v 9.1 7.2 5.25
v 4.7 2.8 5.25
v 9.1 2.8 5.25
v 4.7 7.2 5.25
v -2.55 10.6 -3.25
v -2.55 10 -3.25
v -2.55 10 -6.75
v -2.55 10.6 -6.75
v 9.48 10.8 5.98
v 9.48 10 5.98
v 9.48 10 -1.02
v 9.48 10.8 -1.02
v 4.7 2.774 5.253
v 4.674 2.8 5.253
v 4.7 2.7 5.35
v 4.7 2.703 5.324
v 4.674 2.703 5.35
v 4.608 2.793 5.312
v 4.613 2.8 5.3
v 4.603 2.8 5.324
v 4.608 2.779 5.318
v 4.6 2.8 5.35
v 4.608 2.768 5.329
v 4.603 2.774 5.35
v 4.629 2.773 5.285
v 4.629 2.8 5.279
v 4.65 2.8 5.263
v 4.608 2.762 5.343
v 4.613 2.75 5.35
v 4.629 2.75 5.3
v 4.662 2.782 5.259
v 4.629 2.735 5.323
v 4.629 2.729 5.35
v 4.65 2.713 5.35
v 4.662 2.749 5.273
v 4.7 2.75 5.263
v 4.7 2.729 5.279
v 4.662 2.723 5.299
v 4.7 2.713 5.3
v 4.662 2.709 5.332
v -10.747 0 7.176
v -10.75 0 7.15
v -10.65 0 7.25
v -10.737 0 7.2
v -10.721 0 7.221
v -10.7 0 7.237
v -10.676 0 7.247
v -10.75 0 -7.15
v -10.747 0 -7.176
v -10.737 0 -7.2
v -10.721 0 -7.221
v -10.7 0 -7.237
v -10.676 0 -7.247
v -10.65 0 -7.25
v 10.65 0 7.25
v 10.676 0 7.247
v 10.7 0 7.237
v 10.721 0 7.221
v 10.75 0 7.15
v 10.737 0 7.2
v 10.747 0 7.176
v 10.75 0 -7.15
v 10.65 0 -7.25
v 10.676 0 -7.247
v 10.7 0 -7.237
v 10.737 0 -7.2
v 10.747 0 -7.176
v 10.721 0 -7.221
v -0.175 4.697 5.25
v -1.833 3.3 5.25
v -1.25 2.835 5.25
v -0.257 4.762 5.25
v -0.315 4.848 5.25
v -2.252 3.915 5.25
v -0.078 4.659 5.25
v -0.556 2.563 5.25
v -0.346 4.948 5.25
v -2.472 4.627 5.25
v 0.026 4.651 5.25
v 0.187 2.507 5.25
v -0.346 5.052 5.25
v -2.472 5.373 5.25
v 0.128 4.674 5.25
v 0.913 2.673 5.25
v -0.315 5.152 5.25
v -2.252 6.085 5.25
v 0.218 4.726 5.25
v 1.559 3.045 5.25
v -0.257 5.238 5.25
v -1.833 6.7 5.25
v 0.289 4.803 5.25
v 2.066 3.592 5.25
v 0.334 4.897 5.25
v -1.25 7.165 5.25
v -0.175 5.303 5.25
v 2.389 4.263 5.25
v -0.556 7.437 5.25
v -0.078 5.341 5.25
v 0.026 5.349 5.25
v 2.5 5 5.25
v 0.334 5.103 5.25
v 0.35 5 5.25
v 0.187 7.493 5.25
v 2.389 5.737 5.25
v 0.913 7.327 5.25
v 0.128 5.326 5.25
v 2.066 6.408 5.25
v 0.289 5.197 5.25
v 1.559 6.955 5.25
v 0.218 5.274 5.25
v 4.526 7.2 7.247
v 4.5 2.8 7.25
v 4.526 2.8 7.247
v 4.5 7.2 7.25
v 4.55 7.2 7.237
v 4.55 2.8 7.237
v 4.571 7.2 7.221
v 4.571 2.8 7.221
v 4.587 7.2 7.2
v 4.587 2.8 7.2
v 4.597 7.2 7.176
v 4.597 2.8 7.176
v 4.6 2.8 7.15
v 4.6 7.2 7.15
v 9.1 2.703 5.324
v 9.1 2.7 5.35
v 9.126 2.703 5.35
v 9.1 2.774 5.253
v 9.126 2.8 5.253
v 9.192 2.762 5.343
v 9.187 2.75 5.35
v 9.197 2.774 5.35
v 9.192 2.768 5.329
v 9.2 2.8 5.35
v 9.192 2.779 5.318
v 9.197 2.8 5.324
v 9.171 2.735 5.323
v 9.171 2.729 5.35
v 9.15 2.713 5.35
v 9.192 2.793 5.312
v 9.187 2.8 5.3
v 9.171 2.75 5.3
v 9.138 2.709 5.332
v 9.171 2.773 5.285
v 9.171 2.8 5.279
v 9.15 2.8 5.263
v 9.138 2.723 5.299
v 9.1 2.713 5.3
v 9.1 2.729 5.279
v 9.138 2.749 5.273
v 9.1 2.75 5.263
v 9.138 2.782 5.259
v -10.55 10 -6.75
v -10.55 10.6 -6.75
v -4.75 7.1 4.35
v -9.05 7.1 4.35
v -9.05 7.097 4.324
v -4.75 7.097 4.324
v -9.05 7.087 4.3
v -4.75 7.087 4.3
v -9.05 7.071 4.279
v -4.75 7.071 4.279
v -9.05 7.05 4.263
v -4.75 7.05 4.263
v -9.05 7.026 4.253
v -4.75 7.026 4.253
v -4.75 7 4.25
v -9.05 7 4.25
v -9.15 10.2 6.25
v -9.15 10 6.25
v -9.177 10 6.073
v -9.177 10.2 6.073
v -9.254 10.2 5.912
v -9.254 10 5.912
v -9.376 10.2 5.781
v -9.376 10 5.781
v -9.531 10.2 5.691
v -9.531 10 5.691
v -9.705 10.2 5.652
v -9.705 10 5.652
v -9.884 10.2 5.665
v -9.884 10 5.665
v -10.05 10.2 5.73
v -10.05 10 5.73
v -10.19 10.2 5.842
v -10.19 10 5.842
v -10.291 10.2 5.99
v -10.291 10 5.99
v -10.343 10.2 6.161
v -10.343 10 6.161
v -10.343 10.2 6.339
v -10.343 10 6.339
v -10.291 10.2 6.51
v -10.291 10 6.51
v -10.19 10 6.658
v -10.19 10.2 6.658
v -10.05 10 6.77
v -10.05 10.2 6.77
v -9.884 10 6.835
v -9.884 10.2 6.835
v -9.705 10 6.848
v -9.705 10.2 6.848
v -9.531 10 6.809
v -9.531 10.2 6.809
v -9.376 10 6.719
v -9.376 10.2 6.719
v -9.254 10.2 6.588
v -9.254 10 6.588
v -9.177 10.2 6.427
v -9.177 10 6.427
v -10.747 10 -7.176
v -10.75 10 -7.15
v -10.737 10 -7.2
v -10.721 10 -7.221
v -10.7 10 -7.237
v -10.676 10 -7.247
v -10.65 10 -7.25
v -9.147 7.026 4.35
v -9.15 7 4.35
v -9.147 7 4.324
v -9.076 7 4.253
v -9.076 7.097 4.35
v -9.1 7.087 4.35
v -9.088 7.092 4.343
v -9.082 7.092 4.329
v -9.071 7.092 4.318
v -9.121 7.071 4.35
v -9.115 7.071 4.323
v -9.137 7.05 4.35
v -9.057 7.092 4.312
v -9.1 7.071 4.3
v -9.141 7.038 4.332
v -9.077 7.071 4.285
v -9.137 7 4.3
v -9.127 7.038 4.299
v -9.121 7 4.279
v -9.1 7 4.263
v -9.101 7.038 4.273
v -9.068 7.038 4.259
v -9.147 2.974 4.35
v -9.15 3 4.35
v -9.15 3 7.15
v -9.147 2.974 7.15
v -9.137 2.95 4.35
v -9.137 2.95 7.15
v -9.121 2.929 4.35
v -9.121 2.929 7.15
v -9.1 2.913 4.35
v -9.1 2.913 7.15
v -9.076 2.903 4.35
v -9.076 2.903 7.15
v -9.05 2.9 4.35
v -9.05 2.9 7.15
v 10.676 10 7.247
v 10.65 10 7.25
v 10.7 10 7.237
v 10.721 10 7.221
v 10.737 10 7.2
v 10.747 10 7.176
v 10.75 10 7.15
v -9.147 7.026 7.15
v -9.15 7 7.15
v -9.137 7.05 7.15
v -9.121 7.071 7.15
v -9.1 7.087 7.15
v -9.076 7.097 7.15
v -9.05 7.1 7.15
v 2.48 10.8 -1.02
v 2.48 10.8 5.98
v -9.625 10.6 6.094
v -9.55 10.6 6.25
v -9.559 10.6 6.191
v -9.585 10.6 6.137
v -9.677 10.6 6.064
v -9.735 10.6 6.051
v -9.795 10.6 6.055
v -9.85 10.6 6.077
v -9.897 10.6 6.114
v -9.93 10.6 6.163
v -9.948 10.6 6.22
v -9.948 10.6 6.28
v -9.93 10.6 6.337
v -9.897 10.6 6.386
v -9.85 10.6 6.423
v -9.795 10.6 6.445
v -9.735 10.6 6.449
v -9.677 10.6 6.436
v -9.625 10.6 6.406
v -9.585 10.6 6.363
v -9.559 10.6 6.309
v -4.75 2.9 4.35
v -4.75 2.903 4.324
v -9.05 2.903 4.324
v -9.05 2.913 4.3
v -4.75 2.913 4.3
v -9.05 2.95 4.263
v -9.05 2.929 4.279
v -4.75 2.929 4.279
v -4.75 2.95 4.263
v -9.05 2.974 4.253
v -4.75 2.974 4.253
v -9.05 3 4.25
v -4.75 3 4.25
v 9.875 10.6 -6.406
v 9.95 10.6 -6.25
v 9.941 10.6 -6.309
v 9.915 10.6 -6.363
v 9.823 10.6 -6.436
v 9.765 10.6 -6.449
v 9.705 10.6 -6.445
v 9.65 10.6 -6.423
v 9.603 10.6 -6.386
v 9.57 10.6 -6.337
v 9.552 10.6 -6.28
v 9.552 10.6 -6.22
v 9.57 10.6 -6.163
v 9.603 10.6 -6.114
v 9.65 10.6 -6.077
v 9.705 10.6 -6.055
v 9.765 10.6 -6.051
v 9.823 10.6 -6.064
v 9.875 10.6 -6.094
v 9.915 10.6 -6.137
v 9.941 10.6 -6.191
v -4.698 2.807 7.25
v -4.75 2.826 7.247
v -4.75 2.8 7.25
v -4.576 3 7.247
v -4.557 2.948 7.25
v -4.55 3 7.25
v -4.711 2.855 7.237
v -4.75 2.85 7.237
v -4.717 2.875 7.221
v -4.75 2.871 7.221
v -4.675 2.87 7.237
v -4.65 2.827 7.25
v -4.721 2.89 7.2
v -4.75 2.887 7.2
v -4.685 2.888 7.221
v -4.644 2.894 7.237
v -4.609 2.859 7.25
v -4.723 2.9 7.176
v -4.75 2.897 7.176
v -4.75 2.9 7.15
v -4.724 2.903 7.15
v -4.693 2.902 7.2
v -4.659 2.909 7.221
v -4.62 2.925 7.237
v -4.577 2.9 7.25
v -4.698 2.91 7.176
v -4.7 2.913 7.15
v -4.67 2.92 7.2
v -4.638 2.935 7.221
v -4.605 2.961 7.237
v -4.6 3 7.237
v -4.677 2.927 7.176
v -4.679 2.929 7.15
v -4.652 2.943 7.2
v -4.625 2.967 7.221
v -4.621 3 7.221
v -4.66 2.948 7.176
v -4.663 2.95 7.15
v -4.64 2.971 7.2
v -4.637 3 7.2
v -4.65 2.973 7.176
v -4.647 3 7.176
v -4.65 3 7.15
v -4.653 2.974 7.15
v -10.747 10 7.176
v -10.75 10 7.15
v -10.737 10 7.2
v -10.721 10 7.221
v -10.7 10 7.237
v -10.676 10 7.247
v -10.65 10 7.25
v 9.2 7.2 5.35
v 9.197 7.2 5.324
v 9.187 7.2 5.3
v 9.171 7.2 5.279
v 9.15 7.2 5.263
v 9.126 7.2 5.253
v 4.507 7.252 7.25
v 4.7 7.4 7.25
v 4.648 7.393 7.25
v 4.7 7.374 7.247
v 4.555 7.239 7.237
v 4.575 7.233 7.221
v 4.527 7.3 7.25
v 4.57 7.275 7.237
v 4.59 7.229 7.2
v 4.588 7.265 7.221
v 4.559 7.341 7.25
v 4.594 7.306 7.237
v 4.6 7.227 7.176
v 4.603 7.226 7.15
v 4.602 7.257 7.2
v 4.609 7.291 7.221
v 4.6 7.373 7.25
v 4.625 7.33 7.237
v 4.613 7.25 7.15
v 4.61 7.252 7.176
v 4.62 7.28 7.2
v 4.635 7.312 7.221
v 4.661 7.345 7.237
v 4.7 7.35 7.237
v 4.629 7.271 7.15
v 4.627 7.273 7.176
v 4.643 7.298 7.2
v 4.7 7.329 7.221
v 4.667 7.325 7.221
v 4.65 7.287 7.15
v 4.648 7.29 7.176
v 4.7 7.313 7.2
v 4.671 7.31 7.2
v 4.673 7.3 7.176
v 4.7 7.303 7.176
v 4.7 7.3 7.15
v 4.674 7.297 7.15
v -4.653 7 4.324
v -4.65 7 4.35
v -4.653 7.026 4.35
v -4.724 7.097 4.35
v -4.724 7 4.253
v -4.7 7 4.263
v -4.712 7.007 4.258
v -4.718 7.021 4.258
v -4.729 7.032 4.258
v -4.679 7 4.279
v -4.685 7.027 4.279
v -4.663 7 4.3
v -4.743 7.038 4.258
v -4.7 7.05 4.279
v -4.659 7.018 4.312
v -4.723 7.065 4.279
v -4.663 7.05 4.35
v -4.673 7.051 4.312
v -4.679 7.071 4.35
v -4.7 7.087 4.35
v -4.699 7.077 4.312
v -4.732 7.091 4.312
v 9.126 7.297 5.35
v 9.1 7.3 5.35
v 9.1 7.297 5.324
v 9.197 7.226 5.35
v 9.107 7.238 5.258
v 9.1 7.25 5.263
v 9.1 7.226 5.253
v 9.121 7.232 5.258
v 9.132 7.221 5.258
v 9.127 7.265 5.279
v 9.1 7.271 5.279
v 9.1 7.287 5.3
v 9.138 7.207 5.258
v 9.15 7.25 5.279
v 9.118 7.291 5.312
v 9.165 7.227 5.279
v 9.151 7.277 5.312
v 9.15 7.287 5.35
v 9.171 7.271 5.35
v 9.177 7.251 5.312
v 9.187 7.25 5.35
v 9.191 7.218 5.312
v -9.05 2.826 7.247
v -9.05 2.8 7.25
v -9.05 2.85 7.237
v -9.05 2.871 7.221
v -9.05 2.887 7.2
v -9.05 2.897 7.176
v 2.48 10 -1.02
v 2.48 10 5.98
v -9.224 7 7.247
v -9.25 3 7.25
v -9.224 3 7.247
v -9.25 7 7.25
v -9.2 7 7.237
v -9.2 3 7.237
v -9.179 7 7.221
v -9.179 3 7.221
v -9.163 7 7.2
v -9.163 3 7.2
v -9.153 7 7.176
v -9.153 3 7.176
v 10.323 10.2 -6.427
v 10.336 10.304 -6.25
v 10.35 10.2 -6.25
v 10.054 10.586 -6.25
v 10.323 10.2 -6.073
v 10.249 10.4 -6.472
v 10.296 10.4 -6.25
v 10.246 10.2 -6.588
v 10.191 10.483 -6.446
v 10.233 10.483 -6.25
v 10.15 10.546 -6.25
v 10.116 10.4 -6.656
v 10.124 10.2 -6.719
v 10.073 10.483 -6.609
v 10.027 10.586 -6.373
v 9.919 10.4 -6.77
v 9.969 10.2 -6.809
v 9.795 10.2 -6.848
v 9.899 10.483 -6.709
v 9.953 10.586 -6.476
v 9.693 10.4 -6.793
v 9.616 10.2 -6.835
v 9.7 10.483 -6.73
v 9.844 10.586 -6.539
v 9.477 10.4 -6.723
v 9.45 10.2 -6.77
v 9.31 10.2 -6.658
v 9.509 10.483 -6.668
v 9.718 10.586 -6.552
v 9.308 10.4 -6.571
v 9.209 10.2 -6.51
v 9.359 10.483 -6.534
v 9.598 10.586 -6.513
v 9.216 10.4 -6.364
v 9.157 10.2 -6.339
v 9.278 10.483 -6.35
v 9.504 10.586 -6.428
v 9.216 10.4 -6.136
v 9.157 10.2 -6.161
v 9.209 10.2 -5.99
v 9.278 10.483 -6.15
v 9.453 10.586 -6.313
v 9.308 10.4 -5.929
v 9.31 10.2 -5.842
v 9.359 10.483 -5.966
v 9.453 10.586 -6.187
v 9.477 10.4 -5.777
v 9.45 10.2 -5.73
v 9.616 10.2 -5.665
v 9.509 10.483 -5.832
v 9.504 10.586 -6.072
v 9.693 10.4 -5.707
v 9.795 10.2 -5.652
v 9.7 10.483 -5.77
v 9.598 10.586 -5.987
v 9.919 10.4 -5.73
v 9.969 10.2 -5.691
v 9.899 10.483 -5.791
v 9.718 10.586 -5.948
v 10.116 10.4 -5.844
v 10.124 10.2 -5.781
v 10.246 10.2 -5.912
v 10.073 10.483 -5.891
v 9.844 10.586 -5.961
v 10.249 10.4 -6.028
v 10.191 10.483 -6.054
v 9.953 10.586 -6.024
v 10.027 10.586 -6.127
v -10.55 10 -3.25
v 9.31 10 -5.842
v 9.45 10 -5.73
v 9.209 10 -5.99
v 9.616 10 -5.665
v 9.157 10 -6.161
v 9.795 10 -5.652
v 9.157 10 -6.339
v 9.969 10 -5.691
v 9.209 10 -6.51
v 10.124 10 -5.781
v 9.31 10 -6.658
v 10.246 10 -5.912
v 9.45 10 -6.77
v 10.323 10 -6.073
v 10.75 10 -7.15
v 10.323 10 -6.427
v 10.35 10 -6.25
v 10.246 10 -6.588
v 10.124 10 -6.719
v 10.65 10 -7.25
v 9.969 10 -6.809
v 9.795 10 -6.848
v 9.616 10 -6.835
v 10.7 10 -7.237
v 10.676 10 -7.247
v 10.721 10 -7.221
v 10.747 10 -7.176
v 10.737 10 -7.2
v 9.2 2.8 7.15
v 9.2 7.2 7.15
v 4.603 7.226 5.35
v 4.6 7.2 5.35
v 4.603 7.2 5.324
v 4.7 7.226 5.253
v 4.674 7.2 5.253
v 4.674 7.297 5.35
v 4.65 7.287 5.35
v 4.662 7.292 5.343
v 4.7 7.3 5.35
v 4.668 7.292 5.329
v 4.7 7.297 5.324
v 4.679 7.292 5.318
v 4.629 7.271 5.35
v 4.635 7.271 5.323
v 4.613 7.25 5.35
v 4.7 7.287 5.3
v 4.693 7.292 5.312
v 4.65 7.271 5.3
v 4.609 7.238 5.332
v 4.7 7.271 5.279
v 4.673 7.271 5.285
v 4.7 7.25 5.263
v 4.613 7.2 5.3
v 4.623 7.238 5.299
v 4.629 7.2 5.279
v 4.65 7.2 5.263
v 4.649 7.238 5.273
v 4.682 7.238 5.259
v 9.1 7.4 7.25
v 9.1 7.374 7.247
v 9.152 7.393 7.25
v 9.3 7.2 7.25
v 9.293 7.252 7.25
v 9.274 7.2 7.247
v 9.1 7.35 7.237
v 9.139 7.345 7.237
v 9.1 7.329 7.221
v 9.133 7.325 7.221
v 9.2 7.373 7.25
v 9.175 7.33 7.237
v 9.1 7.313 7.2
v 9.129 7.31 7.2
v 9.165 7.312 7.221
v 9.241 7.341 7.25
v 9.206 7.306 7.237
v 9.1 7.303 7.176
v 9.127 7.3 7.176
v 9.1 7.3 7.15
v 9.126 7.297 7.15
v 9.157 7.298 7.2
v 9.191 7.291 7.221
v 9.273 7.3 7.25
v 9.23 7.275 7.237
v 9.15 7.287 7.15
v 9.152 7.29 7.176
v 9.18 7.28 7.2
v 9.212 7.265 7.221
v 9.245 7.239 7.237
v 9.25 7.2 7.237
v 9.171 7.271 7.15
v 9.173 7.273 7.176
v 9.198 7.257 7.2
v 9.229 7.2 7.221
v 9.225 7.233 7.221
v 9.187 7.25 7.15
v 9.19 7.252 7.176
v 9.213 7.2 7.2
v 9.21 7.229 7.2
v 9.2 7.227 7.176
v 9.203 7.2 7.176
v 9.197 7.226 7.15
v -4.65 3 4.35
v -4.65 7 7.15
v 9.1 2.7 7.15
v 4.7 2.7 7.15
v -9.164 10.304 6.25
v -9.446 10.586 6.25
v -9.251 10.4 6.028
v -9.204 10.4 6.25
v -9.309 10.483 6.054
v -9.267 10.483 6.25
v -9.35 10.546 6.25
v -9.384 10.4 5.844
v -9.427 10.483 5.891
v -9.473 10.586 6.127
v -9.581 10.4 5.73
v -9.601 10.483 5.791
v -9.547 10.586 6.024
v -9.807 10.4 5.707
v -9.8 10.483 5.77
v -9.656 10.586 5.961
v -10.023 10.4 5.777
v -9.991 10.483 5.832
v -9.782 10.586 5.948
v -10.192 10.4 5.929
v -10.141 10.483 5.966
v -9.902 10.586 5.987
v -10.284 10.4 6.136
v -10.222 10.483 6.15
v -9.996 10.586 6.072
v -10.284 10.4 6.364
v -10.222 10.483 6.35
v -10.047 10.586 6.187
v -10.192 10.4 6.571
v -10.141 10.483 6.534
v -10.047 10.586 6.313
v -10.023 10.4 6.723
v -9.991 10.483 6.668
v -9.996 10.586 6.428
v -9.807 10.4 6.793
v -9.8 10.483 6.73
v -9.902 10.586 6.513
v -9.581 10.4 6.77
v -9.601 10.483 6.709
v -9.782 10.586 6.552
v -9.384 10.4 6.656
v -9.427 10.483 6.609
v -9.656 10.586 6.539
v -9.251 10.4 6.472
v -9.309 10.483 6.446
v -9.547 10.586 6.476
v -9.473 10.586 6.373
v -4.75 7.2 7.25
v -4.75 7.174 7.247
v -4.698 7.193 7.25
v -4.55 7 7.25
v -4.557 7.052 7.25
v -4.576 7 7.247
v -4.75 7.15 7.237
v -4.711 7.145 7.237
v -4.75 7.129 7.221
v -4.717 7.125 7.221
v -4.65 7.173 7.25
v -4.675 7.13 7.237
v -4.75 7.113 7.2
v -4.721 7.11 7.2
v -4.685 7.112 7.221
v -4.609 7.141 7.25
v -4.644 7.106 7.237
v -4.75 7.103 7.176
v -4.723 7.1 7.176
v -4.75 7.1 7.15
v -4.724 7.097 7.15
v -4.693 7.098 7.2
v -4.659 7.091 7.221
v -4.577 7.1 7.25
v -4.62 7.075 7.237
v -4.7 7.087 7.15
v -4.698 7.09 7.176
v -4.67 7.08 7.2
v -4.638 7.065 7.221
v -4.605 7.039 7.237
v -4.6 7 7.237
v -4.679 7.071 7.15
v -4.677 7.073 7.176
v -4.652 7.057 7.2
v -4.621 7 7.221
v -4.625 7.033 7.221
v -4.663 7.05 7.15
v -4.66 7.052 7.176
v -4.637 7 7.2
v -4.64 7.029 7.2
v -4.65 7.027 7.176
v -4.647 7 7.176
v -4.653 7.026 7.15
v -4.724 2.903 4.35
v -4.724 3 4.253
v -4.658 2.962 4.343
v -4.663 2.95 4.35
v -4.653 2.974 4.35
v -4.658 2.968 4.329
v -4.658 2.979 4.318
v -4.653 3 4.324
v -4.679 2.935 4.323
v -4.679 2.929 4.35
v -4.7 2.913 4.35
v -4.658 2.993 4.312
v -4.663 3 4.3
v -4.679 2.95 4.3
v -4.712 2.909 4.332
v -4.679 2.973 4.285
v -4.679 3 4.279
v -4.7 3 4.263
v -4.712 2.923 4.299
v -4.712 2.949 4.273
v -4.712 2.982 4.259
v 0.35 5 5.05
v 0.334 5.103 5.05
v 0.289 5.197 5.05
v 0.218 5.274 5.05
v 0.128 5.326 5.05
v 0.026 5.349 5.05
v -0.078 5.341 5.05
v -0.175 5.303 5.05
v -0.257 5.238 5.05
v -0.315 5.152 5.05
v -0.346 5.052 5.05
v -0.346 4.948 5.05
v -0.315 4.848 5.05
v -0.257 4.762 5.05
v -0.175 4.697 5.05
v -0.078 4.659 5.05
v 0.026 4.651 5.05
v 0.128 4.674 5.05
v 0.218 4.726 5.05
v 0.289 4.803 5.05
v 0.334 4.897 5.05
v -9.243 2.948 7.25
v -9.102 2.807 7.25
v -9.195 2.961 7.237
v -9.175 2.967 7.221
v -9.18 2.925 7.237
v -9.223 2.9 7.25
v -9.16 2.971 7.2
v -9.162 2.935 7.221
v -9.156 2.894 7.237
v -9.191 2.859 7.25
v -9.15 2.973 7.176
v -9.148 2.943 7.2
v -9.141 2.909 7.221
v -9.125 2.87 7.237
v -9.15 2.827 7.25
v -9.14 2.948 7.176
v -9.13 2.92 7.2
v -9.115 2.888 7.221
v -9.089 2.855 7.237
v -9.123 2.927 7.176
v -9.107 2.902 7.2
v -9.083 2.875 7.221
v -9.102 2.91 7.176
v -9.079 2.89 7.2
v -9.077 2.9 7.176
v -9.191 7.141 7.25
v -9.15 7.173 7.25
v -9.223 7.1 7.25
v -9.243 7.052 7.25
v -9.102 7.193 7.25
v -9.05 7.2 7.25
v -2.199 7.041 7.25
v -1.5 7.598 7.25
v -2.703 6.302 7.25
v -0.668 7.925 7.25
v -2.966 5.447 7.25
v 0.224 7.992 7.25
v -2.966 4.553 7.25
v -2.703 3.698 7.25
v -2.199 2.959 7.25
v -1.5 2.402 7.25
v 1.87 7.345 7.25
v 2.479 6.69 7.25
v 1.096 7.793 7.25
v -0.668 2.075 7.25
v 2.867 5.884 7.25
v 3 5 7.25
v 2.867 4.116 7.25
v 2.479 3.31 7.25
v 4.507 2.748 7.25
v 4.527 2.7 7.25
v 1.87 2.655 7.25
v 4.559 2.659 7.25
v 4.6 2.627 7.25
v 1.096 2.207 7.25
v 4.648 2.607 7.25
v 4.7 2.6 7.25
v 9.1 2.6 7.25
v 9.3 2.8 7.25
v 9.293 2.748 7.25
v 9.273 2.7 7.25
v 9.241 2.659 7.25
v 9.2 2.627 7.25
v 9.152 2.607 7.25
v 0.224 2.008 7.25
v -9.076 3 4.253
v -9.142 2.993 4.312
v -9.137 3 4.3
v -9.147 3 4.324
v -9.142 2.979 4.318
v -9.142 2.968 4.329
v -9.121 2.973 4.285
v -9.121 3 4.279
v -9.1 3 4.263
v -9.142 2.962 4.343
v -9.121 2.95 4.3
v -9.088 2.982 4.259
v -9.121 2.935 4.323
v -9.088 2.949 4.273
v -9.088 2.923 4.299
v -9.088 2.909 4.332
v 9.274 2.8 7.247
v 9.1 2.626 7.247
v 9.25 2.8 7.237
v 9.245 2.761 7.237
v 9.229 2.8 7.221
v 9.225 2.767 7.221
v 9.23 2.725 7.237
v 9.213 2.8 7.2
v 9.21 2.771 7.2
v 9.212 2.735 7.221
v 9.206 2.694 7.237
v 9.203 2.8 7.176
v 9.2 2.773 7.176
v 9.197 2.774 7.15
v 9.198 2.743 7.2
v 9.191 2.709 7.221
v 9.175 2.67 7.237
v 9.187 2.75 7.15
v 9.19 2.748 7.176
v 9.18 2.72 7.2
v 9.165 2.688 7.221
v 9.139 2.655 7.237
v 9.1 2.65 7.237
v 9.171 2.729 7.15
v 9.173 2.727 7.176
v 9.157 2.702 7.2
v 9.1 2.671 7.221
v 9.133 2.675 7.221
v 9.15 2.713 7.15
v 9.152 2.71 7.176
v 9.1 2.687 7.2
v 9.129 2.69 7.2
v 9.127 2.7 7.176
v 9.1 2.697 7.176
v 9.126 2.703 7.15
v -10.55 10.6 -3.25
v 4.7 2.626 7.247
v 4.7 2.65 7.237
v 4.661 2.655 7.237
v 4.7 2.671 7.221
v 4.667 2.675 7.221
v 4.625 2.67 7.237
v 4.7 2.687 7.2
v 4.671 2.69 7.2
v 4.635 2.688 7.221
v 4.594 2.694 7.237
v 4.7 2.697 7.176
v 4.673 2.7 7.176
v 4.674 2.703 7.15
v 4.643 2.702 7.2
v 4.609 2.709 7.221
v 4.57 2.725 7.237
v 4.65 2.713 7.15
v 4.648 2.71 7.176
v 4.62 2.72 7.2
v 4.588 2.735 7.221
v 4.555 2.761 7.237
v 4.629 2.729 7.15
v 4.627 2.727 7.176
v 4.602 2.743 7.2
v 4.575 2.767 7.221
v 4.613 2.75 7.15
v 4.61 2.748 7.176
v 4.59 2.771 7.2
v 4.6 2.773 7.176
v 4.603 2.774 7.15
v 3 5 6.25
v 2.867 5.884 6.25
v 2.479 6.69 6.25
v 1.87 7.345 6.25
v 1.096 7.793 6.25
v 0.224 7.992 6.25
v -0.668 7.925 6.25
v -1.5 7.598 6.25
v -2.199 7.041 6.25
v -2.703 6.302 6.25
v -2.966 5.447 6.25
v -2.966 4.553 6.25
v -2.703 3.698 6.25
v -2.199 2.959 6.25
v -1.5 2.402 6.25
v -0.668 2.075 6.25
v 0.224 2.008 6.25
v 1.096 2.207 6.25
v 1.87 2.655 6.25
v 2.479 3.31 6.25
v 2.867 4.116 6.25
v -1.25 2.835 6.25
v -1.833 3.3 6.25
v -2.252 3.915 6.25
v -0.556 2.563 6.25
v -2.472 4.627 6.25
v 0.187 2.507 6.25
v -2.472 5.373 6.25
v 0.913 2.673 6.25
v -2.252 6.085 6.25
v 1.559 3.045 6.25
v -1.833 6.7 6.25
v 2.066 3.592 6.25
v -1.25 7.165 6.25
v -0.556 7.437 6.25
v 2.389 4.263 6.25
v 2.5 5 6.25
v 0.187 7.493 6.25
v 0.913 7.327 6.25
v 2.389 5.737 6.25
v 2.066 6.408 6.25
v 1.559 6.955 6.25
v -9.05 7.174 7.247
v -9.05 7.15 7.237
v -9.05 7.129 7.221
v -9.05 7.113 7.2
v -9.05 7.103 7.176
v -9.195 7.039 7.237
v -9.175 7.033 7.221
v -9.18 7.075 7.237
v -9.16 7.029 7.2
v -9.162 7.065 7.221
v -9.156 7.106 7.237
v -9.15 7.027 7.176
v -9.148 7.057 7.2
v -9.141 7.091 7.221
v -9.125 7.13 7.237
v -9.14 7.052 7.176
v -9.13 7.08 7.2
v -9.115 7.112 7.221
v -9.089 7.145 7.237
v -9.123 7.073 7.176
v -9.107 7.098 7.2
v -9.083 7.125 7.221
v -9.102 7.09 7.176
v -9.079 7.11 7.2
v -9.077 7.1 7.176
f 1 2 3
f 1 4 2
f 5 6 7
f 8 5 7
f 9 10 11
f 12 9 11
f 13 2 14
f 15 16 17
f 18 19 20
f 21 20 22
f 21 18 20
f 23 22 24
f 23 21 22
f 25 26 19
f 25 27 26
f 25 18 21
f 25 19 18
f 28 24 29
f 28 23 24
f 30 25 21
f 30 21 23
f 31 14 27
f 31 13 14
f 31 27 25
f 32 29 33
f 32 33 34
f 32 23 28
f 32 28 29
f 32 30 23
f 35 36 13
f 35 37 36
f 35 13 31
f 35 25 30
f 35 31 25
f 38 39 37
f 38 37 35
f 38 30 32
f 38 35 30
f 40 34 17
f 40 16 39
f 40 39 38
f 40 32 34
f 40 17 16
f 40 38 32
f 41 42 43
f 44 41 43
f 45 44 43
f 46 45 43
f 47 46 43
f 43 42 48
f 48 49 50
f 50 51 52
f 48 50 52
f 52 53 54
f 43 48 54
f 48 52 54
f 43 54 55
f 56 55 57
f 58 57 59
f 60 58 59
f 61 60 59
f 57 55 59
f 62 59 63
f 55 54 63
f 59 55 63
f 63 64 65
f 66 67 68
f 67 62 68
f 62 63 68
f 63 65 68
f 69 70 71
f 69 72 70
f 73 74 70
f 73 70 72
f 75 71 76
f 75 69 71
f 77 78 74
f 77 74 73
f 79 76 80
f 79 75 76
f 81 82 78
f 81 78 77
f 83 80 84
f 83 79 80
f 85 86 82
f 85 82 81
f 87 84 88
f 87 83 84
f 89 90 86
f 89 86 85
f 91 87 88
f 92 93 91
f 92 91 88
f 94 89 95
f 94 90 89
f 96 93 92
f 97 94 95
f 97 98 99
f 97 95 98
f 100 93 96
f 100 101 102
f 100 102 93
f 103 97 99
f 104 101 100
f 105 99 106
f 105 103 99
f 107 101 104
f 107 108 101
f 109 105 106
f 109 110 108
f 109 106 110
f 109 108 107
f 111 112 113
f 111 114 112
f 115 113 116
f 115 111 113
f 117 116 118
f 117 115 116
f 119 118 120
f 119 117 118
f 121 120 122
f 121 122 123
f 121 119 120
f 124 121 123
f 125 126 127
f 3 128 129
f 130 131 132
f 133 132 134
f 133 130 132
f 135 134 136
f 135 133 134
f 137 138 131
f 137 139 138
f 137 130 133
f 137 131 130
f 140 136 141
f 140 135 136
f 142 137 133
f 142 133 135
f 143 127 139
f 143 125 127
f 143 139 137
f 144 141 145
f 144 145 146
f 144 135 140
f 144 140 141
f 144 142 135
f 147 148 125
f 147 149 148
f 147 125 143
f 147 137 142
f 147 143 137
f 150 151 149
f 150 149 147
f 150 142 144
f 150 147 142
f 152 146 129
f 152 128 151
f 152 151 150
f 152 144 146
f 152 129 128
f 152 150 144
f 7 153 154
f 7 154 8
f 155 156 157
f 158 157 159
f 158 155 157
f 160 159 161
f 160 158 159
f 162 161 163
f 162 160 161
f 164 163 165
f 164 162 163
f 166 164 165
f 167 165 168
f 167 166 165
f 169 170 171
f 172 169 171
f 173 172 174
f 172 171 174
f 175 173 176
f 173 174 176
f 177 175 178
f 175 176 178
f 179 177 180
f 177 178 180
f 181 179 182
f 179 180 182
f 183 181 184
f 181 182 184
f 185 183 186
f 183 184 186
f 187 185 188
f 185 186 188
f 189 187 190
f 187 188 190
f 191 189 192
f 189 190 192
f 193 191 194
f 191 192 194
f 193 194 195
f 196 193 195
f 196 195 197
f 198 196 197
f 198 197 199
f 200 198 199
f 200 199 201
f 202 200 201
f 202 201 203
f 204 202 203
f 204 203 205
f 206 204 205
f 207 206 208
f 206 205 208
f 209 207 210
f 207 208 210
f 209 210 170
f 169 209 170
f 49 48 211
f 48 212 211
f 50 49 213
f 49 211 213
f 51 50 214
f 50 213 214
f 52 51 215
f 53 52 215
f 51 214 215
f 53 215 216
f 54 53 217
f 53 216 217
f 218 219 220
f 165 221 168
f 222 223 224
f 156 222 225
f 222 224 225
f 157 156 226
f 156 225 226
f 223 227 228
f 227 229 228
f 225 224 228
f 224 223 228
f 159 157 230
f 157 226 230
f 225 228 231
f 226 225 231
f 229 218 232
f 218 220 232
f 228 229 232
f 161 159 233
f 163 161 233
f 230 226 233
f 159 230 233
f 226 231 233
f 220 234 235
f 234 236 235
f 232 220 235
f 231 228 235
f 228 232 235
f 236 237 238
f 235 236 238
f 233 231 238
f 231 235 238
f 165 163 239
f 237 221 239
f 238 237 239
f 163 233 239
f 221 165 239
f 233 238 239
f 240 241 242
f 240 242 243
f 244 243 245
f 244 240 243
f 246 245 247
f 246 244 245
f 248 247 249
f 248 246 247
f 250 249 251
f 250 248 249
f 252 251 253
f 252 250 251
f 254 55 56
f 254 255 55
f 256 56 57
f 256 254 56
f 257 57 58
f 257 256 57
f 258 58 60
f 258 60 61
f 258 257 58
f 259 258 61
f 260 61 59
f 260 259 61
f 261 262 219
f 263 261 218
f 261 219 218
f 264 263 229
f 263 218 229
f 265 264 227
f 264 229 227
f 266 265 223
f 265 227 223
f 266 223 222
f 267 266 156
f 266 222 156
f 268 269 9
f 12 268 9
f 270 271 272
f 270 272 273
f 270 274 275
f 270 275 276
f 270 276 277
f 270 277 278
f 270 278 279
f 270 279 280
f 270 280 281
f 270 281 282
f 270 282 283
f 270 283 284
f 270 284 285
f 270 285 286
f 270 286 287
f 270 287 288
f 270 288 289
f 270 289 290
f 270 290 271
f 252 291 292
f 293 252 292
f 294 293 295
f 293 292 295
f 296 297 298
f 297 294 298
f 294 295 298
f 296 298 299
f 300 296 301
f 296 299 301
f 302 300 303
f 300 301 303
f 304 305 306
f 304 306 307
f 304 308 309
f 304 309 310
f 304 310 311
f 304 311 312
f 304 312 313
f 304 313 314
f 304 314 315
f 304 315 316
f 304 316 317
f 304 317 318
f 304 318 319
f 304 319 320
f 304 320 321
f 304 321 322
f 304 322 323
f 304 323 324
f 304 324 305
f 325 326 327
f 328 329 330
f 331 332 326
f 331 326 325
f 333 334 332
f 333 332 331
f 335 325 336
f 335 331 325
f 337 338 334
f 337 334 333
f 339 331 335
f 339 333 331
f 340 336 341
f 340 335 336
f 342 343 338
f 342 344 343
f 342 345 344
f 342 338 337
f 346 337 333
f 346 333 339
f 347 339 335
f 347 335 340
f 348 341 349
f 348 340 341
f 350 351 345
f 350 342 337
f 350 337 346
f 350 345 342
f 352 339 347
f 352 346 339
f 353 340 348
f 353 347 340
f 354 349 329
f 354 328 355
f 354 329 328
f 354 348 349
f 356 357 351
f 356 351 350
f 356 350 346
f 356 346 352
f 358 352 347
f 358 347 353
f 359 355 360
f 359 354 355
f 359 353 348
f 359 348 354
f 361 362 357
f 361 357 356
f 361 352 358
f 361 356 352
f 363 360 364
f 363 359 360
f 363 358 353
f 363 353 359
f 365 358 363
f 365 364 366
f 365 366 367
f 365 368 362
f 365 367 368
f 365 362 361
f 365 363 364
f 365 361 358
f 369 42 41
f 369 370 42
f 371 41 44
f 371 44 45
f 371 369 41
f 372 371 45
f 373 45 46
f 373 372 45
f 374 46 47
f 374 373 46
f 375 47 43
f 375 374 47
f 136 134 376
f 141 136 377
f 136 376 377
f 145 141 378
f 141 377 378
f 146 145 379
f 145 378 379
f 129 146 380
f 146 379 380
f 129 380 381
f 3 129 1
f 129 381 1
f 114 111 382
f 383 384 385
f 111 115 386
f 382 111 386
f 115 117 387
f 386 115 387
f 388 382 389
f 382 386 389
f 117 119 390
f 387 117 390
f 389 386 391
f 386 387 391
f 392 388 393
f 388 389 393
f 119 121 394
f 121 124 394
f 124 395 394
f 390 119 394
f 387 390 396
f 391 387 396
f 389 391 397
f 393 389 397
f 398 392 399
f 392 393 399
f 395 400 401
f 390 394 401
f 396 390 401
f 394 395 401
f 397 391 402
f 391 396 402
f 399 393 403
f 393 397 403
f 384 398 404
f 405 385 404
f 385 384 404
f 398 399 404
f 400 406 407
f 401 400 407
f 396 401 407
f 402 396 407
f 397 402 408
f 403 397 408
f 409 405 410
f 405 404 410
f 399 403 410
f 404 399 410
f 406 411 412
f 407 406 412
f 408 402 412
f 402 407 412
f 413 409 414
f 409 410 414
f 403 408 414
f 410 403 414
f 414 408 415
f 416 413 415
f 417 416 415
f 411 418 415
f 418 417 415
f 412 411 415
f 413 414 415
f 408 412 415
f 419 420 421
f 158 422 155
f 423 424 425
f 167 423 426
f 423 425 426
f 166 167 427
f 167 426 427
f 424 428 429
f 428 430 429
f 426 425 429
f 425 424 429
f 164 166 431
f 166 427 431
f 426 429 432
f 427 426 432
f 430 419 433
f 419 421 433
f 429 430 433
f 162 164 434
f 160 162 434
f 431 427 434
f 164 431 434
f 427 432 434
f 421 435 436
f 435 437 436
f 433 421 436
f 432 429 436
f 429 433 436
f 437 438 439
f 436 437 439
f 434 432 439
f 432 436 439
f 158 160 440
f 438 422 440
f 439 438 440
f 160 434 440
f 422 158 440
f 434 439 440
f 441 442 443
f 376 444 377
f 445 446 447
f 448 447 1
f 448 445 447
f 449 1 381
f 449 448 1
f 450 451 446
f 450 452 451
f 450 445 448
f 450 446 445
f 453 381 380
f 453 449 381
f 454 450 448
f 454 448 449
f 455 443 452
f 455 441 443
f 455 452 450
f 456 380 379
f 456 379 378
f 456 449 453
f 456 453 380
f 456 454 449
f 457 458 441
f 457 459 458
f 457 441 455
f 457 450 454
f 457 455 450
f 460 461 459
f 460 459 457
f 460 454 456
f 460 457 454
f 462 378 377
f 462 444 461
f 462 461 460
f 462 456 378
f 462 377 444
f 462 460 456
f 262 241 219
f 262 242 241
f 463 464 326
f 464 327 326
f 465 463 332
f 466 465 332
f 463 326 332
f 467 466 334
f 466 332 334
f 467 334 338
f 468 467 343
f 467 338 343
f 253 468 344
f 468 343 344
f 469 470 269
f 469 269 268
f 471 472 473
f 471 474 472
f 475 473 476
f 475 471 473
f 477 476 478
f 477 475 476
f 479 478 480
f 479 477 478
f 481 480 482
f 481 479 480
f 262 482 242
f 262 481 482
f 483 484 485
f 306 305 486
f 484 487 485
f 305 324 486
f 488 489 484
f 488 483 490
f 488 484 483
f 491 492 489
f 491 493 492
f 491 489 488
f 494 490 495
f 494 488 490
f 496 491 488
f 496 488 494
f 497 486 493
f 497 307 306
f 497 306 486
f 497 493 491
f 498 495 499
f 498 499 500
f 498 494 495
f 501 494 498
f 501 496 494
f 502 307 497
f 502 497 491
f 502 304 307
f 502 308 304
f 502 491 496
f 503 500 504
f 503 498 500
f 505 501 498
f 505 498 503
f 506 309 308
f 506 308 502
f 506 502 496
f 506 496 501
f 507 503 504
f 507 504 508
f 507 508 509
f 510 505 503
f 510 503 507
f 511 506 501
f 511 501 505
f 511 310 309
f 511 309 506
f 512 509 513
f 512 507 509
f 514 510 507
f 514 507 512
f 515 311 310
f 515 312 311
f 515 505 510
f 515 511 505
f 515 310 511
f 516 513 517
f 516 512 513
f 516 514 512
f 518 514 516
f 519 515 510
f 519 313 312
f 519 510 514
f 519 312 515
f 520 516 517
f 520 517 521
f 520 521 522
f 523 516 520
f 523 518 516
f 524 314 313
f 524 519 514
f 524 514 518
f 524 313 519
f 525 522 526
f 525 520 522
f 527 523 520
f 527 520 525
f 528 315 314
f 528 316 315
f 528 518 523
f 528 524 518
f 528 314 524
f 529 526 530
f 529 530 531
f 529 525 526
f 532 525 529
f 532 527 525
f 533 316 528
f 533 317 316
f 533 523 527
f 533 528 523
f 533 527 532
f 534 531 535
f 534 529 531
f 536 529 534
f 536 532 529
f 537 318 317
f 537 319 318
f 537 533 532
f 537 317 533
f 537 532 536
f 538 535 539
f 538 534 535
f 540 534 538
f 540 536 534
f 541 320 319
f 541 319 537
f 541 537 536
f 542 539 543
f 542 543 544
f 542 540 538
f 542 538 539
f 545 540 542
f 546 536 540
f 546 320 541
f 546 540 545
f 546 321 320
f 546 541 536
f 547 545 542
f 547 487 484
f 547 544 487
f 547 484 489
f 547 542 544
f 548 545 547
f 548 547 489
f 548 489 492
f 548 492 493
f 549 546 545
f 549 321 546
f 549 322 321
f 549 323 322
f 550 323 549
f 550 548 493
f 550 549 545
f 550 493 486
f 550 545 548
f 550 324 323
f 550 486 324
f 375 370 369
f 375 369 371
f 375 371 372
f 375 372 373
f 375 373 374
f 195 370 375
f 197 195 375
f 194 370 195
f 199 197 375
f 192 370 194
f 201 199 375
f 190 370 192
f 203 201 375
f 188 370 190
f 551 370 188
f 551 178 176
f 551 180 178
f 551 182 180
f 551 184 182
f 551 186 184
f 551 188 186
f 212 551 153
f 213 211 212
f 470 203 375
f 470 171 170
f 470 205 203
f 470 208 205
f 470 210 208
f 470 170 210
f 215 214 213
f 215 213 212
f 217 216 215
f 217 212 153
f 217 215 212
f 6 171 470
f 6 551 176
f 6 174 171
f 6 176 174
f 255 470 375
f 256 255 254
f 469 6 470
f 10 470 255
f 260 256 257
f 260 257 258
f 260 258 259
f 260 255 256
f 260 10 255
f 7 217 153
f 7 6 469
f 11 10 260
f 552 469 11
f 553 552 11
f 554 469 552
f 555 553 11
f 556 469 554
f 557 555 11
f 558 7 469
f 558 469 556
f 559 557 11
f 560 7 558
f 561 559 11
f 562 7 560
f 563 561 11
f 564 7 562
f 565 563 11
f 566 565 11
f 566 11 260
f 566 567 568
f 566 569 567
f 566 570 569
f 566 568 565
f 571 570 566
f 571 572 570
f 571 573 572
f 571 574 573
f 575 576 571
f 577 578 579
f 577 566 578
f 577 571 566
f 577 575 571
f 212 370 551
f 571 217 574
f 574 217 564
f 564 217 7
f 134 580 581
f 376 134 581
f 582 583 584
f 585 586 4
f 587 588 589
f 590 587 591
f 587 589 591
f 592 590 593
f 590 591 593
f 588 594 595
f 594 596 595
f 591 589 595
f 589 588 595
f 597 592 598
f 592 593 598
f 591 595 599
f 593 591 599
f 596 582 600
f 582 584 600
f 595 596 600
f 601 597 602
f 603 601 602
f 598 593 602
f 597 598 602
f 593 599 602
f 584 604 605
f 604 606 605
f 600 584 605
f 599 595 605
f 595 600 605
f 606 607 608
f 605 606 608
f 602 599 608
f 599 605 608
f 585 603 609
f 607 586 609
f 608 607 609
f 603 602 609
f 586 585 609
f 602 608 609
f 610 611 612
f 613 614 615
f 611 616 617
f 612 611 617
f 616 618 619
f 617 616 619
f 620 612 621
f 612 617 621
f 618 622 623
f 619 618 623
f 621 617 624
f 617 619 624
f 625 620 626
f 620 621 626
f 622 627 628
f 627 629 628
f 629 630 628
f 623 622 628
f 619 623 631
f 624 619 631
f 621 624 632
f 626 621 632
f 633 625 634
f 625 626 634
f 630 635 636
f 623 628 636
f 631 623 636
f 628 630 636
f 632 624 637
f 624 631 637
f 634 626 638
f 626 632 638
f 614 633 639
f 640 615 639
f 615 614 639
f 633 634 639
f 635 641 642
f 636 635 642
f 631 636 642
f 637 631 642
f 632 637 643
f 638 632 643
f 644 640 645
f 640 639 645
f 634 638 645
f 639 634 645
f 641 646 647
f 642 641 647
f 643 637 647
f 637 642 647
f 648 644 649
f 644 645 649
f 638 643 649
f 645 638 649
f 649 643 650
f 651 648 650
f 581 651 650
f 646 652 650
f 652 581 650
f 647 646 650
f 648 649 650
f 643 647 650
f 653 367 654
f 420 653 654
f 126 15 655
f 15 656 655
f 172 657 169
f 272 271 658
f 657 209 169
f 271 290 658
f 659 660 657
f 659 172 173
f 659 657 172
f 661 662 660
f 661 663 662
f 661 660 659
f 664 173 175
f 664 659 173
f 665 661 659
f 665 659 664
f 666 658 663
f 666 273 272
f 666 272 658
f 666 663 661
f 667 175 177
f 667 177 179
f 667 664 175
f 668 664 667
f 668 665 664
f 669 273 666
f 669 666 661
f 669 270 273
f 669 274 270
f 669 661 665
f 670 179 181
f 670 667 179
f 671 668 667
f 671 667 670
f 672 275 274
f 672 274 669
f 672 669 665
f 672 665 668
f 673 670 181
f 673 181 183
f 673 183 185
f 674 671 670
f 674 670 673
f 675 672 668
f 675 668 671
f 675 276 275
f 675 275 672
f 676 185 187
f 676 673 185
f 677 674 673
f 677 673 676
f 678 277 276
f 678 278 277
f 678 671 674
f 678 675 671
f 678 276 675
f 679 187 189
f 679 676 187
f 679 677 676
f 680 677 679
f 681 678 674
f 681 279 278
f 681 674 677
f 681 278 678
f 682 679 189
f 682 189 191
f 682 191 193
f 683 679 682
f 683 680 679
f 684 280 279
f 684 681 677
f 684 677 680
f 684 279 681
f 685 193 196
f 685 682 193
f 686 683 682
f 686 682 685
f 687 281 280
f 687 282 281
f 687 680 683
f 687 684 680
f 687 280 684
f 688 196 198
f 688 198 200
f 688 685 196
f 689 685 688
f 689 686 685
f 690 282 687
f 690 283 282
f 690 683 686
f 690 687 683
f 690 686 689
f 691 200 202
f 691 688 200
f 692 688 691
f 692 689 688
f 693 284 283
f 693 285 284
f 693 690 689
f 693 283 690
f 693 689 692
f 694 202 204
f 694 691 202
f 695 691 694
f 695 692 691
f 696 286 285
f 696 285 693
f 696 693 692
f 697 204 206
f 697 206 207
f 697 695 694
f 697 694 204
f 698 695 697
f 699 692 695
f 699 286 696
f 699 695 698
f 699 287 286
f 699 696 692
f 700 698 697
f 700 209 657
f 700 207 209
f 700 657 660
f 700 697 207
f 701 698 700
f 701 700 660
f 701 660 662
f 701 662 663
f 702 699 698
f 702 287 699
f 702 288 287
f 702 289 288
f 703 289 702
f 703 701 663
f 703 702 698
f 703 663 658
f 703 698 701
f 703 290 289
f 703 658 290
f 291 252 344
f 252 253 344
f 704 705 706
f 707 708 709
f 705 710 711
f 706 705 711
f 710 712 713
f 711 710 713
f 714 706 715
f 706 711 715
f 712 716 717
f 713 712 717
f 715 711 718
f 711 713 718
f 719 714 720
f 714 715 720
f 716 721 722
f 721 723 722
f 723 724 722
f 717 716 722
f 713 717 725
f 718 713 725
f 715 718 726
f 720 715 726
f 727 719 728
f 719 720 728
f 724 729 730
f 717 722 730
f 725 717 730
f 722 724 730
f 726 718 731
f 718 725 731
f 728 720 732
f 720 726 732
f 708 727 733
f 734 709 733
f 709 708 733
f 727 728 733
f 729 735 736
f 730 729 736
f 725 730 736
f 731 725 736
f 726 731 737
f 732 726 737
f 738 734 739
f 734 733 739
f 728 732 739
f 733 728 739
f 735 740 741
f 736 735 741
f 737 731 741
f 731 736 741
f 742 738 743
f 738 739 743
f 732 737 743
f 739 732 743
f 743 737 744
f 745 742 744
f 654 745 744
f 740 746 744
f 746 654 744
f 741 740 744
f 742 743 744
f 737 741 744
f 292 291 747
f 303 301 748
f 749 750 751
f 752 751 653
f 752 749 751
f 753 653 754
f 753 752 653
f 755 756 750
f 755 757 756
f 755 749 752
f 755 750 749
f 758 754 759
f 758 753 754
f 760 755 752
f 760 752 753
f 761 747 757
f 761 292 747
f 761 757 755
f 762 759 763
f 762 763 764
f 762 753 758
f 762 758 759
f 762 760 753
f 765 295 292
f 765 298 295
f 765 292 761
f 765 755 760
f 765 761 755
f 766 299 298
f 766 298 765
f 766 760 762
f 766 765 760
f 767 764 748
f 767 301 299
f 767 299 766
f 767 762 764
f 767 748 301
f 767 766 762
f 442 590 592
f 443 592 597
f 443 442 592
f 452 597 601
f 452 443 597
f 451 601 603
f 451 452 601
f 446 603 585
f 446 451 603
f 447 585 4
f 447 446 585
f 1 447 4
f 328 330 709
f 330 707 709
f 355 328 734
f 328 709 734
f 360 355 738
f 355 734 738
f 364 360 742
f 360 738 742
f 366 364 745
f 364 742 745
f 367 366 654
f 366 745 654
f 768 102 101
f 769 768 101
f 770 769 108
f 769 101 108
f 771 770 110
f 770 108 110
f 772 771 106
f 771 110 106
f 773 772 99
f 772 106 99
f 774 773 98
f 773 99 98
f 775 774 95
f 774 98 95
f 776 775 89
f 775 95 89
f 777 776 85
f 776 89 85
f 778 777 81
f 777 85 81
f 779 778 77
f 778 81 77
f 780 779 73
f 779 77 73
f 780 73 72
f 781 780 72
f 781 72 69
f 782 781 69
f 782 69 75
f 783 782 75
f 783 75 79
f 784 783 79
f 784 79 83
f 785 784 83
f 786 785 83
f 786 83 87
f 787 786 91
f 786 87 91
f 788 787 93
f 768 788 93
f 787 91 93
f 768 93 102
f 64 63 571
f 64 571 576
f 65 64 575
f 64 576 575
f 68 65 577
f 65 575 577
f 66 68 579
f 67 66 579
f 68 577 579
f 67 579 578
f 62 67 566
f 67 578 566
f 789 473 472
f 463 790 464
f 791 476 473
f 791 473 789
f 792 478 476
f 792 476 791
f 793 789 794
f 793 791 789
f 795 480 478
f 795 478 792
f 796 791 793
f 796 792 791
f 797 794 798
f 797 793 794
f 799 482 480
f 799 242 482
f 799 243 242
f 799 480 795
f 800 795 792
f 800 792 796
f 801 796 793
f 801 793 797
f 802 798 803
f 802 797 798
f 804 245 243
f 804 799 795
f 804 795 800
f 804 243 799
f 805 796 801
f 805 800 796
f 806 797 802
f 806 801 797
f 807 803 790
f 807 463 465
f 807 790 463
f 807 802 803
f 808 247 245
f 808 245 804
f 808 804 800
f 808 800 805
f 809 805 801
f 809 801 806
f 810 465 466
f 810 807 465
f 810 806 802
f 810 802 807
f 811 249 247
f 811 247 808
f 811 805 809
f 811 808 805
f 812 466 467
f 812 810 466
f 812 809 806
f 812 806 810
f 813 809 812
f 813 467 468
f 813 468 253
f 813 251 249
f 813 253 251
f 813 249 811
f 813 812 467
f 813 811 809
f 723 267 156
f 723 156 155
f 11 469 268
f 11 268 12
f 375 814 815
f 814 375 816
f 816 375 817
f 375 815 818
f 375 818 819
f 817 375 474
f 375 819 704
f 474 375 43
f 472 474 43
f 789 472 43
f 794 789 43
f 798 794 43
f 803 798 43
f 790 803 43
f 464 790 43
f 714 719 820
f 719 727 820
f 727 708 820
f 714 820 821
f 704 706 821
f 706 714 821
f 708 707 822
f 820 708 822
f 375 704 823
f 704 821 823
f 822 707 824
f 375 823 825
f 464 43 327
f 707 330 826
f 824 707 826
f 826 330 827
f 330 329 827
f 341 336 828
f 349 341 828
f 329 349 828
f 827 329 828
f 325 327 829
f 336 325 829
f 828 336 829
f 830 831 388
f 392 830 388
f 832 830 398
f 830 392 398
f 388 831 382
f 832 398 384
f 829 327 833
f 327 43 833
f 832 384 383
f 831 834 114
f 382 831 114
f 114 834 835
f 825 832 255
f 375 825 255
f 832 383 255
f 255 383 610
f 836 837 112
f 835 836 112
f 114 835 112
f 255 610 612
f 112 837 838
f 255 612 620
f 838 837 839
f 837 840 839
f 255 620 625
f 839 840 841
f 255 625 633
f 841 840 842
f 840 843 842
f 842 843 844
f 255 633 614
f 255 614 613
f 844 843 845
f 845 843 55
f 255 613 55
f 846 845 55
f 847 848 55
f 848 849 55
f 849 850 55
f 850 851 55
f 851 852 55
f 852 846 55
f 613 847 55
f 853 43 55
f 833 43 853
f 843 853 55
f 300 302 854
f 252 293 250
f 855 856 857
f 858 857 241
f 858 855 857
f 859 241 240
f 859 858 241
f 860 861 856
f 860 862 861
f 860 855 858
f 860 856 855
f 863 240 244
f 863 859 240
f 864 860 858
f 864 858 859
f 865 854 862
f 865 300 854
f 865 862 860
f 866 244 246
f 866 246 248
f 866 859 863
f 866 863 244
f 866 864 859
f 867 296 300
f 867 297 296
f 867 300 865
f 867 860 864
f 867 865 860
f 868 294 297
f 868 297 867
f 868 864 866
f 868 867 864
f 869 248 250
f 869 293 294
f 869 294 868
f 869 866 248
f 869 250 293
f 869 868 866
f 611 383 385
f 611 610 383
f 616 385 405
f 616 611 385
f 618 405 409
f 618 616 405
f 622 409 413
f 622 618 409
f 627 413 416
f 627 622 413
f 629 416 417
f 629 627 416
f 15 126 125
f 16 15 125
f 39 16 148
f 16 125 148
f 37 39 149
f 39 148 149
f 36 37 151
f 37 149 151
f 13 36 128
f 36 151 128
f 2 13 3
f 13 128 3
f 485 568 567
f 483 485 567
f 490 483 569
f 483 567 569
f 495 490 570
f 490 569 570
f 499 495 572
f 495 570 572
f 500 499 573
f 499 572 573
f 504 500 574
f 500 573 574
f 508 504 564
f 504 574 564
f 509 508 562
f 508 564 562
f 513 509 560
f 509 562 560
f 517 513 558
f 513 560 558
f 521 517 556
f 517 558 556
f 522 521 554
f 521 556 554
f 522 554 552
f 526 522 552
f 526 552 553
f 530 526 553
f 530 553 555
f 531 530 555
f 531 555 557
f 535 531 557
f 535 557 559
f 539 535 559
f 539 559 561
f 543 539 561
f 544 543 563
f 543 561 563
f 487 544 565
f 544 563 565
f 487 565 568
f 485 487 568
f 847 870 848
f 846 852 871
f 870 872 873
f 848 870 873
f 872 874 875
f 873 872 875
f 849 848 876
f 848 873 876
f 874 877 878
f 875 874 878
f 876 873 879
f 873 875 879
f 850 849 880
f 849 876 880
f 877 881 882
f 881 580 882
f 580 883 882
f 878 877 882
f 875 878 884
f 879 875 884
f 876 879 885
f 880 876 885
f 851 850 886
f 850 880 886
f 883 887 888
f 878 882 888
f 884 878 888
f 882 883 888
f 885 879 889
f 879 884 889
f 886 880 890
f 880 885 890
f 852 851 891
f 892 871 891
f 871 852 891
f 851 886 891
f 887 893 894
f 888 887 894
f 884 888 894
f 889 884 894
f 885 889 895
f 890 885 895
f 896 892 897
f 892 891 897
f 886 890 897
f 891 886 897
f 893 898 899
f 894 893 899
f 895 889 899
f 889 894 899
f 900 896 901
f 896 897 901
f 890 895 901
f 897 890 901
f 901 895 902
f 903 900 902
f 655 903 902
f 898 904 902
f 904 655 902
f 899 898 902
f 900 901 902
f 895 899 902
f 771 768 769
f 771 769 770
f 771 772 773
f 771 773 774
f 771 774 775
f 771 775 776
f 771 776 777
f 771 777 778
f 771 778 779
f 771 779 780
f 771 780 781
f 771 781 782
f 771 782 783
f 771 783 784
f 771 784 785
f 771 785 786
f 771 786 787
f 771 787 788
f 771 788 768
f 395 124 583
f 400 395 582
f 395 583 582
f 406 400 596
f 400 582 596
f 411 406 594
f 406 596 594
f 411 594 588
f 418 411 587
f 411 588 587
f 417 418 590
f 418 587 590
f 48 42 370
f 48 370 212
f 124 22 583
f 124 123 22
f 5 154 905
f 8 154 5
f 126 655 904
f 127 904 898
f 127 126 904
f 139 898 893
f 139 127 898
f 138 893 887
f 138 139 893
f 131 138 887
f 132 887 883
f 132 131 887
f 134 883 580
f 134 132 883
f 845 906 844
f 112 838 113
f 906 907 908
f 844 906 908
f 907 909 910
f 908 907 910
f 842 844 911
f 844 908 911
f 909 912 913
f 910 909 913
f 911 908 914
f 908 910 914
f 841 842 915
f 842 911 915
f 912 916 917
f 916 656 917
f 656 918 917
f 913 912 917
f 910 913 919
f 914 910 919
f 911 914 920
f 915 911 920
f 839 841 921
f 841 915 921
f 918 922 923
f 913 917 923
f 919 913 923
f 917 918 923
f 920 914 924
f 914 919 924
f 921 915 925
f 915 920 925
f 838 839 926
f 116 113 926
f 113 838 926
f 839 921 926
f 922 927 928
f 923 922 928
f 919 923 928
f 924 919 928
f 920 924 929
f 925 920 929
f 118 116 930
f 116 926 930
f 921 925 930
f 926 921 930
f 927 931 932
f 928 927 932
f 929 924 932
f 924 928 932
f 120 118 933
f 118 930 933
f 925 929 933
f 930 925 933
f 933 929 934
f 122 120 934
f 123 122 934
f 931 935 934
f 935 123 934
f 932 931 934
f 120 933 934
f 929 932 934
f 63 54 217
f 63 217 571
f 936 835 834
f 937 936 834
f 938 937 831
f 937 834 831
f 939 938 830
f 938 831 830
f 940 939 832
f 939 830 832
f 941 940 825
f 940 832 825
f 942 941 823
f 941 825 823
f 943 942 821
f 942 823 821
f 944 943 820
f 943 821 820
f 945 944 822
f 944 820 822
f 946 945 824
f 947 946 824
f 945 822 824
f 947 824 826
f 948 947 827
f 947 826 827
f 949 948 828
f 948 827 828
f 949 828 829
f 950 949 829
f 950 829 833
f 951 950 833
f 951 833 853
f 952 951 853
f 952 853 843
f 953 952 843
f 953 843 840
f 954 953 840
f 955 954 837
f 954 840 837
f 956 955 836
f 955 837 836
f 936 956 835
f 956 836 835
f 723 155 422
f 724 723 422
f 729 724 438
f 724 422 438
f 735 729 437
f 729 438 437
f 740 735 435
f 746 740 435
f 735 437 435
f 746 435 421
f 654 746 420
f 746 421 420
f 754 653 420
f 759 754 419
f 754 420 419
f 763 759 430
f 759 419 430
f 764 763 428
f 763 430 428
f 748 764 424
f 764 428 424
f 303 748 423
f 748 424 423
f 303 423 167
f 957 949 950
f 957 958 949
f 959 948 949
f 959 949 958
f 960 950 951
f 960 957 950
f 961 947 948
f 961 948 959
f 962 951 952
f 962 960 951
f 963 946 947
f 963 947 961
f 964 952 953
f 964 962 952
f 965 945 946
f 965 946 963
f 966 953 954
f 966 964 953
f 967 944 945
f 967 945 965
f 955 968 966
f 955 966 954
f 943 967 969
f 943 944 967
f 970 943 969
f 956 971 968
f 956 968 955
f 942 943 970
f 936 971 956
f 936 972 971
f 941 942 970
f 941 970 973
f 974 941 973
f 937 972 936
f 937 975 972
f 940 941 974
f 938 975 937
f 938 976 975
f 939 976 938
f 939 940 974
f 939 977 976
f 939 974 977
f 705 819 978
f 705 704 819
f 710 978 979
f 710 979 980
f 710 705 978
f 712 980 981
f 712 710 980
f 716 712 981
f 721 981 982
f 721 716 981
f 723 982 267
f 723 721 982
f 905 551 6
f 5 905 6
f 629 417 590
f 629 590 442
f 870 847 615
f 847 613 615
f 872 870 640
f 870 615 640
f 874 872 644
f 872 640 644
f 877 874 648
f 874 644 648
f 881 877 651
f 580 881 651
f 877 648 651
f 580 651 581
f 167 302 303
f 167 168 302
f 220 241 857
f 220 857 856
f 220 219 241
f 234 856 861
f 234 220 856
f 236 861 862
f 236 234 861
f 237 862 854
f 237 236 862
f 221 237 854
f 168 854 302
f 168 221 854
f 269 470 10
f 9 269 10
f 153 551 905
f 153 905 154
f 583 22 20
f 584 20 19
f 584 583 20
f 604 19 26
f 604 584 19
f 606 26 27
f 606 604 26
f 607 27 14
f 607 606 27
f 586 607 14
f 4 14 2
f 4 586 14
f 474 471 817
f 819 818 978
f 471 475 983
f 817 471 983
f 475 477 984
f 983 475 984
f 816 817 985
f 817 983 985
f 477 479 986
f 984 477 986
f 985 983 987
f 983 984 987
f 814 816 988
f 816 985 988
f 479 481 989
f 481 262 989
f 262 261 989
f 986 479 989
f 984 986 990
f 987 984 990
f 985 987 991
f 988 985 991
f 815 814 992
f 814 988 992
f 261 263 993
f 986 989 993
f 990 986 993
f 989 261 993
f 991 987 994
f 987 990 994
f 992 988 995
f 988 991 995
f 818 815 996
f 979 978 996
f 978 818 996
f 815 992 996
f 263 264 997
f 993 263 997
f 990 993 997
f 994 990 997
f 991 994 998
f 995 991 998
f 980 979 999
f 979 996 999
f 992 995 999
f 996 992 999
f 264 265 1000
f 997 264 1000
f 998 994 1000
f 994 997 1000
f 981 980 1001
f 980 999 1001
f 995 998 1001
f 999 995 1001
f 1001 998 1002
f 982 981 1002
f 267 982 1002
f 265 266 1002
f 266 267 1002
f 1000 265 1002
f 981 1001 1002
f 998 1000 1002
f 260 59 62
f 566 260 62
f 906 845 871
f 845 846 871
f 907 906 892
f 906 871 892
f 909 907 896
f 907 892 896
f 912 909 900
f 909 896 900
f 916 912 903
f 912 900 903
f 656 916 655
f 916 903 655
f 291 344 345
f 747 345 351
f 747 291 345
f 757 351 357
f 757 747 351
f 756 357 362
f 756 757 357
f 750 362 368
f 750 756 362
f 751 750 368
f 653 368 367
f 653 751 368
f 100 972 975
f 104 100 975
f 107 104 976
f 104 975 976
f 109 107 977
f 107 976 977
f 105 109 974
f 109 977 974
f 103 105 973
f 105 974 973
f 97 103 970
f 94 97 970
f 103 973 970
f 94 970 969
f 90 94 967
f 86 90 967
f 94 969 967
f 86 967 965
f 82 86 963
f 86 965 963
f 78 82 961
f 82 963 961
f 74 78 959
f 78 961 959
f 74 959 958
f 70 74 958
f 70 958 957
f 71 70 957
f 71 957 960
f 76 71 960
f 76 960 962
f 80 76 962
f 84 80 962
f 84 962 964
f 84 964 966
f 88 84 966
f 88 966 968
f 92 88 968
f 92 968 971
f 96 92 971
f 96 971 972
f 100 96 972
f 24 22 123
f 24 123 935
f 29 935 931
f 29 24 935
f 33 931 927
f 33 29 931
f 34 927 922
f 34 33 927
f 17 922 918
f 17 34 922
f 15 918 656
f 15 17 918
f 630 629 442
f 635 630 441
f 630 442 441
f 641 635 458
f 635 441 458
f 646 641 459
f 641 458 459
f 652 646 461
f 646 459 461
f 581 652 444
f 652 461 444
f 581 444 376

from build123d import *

# Parameters (mm, degrees)
SKETCH_1_W          = 21.5
SKETCH_1_H          = 14.5
EXTRUDE_1_DEPTH     = 10
SKETCH_2_W          = 4.5
SKETCH_2_H          = 4.2
CUT_EXTRUDE_1_DEPTH = 3
SKETCH_2_3_R        = 2.5
SKETCH_2_3_W        = 4.6
SKETCH_2_3_H        = 4.6
CUT_EXTRUDE_2_DEPTH = 2
SKETCH_2_4_R        = 3
SKETCH_2_4_R_2      = 2.5
CUT_EXTRUDE_3_DEPTH = 1
SKETCH_3_W          = 7
SKETCH_3_H          = 7
EXTRUDE_2_DEPTH     = 0.8
SKETCH_4_R          = 0.6
SKETCH_4_W          = 8
SKETCH_4_H          = 3.5
EXTRUDE_3_DEPTH     = 0.6
FILLET_1_R          = 0.4
SKETCH_5_R          = 0.35
CUT_EXTRUDE_4_DEPTH = 0.2
FILLET_2_R          = 0.1


with BuildPart() as part:
    # 草图1 → 凸台-拉伸1 (new body)
    with BuildSketch(Plane(origin=(0, 0, 0), x_dir=(1, 0, 0), z_dir=(0, 1, 0))):
        Rectangle(SKETCH_1_W, SKETCH_1_H)
    extrude(amount=EXTRUDE_1_DEPTH)

    # 草图2 → 切除-拉伸1 (cut)
    with BuildSketch(Plane.XY.offset(7.25)):
        with Locations((-6.9, 5)):
            Rectangle(SKETCH_2_W, SKETCH_2_H)
    extrude(amount=-CUT_EXTRUDE_1_DEPTH, mode=Mode.SUBTRACT)

    # 草图2<3> → 切除-拉伸2 (cut)
    with BuildSketch(Plane.XY.offset(7.25)):
        with Locations((0, 5)):
            Circle(SKETCH_2_3_R)
        with Locations((6.9, 5)):
            Rectangle(SKETCH_2_3_W, SKETCH_2_3_H)
    extrude(amount=-CUT_EXTRUDE_2_DEPTH, mode=Mode.SUBTRACT)

    # 草图2<4> → 切除-拉伸3 (cut)
    with BuildSketch(Plane.XY.offset(7.25)):
        with Locations((0, 5)):
            Circle(SKETCH_2_4_R)
        with Locations((0, 5)):
            Circle(SKETCH_2_4_R_2, mode=Mode.SUBTRACT)
    extrude(amount=-CUT_EXTRUDE_3_DEPTH, mode=Mode.SUBTRACT)

    # 草图3 → 凸台-拉伸2 (add)
    with BuildSketch(Plane(origin=(0, 10, 0), x_dir=(1, 0, 0), z_dir=(0, 1, 0))):
        with Locations((5.98, -2.48)):
            Rectangle(SKETCH_3_W, SKETCH_3_H)
    extrude(amount=EXTRUDE_2_DEPTH)

    # 草图4 → 凸台-拉伸3 (add)
    with BuildSketch(Plane(origin=(0, 10, 0), x_dir=(1, 0, 0), z_dir=(0, 1, 0))):
        with Locations((-9.75, -6.25)):
            Circle(SKETCH_4_R)
        with Locations((9.75, 6.25)):
            Circle(SKETCH_4_R)
        with Locations((-6.55, 5)):
            Rectangle(SKETCH_4_W, SKETCH_4_H)
    extrude(amount=EXTRUDE_3_DEPTH)

    # 圆角1
    fillet_1_edges = [part.edges().sort_by_distance(p)[0] for p in [
        (-10.35, 10.6, 6.25),
        (9.15, 10.6, -6.25),
    ]]
    fillet(fillet_1_edges, radius=FILLET_1_R)

    # 草图5 → 切除-拉伸4 (cut)
    with BuildSketch(Plane.XY.offset(5.25)):
        with Locations((0, 5)):
            Circle(SKETCH_5_R)
    extrude(amount=-CUT_EXTRUDE_4_DEPTH, mode=Mode.SUBTRACT)

    # 圆角2
    fillet_2_edges = [part.edges().sort_by_distance(p)[0] for p in [
        (-4.65, 5, 7.25),
        (-4.65, 7.1, 5.75),
        (-6.9, 2.9, 4.25),
        (-4.65, 2.9, 5.75),
        (-9.15, 5, 4.25),
        (-9.15, 2.9, 5.75),
        (-6.9, 7.1, 7.25),
        (-9.15, 7.1, 5.75),
        (-4.65, 5, 4.25),
        (-6.9, 7.1, 4.25),
        (-9.15, 5, 7.25),
        (-6.9, 2.9, 7.25),
        (6.9, 2.7, 5.25),
        (9.2, 2.7, 6.25),
        (4.6, 5, 5.25),
        (4.6, 2.7, 6.25),
        (6.9, 7.3, 7.25),
        (4.6, 7.3, 6.25),
        (9.2, 5, 7.25),
        (9.2, 7.3, 6.25),
        (6.9, 7.3, 5.25),
        (9.2, 5, 5.25),
        (6.9, 2.7, 7.25),
        (4.6, 5, 7.25),
        (-10.75, 5, -7.25),
        (10.75, 5, -7.25),
        (10.75, 5, 7.25),
        (-10.75, 5, 7.25),
    ]]
    fillet(fillet_2_edges, radius=FILLET_2_R)


solid = part.part
